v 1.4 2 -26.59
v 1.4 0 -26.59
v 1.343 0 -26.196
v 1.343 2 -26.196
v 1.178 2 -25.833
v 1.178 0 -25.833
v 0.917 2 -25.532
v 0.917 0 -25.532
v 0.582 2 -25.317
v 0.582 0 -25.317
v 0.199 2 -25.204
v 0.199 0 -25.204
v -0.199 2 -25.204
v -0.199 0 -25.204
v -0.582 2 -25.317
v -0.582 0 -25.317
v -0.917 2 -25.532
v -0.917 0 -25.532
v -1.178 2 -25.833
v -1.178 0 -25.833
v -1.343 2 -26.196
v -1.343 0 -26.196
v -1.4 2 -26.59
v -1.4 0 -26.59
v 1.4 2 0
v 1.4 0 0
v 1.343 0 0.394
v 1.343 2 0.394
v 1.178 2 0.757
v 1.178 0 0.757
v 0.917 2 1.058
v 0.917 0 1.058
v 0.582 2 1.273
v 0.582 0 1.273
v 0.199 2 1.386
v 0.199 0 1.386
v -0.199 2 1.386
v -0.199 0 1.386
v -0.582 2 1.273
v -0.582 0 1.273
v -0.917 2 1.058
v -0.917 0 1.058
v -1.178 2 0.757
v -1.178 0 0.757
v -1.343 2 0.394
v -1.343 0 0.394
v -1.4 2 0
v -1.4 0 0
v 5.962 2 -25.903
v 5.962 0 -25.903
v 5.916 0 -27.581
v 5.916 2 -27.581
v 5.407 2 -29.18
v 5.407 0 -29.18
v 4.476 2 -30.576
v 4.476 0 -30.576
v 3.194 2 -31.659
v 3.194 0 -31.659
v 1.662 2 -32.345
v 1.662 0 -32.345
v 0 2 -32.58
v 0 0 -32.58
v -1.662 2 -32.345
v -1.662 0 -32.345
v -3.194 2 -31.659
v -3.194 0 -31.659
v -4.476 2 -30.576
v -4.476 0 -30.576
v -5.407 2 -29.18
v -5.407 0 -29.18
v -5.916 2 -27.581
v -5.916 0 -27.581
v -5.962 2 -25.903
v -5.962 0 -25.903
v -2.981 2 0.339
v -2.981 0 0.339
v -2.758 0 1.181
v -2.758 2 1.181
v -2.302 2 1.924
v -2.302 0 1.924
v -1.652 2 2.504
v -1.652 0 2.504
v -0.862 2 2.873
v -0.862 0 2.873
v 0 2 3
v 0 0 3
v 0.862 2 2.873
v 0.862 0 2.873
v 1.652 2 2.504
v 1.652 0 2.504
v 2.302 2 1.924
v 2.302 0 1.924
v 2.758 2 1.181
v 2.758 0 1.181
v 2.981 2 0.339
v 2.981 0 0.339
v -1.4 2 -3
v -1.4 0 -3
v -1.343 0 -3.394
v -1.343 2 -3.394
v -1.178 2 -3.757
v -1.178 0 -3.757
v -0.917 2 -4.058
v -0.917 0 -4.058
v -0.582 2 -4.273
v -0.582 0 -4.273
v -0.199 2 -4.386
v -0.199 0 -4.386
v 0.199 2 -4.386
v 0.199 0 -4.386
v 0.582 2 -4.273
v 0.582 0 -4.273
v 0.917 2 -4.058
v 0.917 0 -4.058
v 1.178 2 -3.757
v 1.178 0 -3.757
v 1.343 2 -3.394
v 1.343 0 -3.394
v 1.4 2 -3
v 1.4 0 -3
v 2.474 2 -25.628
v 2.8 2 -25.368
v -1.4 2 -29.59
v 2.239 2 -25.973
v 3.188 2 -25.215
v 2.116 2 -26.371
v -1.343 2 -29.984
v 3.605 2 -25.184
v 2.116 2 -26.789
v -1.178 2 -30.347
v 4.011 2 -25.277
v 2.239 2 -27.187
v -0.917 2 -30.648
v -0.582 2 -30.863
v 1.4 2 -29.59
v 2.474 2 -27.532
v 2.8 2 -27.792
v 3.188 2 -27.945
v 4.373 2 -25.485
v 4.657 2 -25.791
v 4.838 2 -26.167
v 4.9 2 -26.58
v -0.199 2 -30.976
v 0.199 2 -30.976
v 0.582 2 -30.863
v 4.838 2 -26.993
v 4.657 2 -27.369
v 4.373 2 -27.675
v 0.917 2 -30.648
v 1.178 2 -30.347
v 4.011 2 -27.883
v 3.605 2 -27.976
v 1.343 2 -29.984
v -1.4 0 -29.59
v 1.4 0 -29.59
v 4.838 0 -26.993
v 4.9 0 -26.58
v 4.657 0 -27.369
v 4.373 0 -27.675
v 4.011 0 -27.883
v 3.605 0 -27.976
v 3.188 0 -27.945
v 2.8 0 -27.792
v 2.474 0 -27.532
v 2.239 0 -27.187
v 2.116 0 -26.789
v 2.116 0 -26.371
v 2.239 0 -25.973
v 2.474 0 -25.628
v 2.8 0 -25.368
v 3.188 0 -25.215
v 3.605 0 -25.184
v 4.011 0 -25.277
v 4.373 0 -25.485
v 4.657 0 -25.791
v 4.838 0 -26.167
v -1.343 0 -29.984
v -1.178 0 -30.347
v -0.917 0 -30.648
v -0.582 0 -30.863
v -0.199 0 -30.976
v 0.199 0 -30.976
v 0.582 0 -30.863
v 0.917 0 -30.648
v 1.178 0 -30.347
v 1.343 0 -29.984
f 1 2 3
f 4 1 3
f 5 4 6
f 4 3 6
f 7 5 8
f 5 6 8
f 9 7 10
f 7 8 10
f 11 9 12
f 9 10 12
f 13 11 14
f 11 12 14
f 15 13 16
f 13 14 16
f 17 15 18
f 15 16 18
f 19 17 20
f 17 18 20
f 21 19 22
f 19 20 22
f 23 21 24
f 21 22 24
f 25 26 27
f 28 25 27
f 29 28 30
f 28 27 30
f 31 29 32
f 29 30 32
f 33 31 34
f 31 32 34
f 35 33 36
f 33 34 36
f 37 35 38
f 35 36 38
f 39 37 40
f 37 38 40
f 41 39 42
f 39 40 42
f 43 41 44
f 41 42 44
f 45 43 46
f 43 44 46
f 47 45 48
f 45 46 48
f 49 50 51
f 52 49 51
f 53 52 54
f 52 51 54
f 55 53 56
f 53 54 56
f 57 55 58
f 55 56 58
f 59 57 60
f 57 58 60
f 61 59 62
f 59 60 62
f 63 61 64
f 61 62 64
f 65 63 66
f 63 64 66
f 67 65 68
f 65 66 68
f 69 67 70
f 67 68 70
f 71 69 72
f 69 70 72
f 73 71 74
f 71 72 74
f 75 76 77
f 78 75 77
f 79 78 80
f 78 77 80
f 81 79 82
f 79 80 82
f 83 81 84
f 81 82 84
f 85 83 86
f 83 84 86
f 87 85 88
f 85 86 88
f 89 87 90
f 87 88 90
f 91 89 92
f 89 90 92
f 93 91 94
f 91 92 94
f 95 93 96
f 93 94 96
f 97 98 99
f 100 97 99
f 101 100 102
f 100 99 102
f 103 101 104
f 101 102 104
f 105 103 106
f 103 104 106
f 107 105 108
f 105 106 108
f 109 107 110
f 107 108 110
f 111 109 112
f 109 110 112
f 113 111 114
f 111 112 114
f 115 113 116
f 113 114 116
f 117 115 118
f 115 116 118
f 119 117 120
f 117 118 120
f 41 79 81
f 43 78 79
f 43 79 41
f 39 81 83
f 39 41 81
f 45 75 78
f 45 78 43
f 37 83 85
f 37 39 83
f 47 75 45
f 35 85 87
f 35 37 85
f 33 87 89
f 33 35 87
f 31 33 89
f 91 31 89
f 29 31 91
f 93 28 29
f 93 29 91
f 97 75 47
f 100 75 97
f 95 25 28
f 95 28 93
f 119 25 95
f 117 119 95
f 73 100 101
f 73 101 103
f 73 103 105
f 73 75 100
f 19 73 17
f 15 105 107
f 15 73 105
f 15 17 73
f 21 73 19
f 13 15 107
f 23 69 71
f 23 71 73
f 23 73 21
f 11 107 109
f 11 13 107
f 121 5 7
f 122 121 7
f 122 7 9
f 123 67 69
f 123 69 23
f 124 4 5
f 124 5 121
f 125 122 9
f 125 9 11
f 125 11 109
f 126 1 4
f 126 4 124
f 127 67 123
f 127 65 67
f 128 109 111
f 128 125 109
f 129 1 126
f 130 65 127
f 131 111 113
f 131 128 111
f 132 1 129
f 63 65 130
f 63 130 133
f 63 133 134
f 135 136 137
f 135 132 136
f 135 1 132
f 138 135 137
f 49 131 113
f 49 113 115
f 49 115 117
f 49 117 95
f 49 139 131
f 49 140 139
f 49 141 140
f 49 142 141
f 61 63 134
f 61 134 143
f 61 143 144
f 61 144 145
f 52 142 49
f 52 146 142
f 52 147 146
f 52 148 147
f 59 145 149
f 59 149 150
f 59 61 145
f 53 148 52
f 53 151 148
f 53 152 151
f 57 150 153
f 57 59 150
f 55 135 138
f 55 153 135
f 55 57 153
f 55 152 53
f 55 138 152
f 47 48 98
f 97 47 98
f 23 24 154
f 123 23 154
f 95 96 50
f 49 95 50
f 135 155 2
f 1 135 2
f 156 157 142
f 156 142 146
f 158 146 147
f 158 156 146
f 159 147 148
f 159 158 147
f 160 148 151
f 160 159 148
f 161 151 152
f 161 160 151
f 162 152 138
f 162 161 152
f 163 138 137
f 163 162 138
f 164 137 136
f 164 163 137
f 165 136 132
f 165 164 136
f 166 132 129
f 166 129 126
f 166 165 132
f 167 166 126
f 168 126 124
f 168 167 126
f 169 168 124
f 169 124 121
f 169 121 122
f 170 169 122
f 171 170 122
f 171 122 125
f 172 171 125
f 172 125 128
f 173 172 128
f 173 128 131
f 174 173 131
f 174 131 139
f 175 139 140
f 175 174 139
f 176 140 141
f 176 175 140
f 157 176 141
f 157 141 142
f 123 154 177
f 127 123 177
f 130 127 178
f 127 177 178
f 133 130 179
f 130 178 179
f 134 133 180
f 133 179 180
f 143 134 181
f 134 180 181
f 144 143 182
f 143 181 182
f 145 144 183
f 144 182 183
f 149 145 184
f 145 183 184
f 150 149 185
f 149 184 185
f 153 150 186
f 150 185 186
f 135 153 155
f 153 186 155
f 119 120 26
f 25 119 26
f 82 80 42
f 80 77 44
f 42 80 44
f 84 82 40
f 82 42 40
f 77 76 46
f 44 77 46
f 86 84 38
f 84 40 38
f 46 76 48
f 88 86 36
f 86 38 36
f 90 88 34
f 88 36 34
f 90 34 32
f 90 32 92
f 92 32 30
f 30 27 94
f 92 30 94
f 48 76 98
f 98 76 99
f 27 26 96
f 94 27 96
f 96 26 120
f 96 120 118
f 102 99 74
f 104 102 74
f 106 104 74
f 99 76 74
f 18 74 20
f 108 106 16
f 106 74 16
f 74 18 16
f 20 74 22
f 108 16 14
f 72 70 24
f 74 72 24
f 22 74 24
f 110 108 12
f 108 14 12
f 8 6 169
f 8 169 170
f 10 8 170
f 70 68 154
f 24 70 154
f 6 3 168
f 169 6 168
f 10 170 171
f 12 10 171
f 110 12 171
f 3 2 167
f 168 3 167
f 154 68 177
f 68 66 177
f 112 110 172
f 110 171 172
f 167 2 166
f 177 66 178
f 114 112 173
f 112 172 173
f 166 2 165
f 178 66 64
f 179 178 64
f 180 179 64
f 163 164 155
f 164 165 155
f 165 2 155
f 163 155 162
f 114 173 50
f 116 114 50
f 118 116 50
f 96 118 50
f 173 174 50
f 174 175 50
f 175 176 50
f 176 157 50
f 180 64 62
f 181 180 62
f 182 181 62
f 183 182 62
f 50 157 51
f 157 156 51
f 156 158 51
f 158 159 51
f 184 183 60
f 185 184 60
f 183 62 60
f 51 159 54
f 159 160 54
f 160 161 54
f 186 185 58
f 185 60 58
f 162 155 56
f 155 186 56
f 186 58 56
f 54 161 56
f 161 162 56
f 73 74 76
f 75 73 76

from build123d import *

# Parameters (mm, degrees)
SKETCH1_R           = 1.4
BOSS_EXTRUDE1_DEPTH = 2


with BuildPart() as part:
    # Sketch1 → Boss-Extrude1 (new body)
    with BuildSketch(Plane(origin=(0, 0, 0), x_dir=(1, 0, 0), z_dir=(0, 1, 0))):
        with BuildLine():
            Line((-5.961660753, 25.902799097), (-2.980830377, -0.338600451))
            ThreePointArc((-2.980830377, -0.338600451), (0, -3), (2.980830377, -0.338600451))
            Line((2.980830377, -0.338600451), (5.961660753, 25.902799097))
            ThreePointArc((5.961660753, 25.902799097), (0, 32.58), (-5.961660753, 25.902799097))
        make_face()
        with Locations((3.5, 26.58)):
            Circle(SKETCH1_R, mode=Mode.SUBTRACT)
        with BuildLine():
            Line((-1.4, 0), (-1.4, 3))
            ThreePointArc((-1.4, 3), (0, 4.4), (1.4, 3))
            Line((1.4, 3), (1.4, 0))
            ThreePointArc((1.4, 0), (0, -1.4), (-1.4, 0))
        make_face(mode=Mode.SUBTRACT)
        with BuildLine():
            Line((1.4, 29.59), (1.4, 26.59))
            ThreePointArc((1.4, 26.59), (0, 25.19), (-1.4, 26.59))
            Line((-1.4, 26.59), (-1.4, 29.59))
            ThreePointArc((-1.4, 29.59), (0, 30.99), (1.4, 29.59))
        make_face(mode=Mode.SUBTRACT)
    extrude(amount=BOSS_EXTRUDE1_DEPTH)


solid = part.part
